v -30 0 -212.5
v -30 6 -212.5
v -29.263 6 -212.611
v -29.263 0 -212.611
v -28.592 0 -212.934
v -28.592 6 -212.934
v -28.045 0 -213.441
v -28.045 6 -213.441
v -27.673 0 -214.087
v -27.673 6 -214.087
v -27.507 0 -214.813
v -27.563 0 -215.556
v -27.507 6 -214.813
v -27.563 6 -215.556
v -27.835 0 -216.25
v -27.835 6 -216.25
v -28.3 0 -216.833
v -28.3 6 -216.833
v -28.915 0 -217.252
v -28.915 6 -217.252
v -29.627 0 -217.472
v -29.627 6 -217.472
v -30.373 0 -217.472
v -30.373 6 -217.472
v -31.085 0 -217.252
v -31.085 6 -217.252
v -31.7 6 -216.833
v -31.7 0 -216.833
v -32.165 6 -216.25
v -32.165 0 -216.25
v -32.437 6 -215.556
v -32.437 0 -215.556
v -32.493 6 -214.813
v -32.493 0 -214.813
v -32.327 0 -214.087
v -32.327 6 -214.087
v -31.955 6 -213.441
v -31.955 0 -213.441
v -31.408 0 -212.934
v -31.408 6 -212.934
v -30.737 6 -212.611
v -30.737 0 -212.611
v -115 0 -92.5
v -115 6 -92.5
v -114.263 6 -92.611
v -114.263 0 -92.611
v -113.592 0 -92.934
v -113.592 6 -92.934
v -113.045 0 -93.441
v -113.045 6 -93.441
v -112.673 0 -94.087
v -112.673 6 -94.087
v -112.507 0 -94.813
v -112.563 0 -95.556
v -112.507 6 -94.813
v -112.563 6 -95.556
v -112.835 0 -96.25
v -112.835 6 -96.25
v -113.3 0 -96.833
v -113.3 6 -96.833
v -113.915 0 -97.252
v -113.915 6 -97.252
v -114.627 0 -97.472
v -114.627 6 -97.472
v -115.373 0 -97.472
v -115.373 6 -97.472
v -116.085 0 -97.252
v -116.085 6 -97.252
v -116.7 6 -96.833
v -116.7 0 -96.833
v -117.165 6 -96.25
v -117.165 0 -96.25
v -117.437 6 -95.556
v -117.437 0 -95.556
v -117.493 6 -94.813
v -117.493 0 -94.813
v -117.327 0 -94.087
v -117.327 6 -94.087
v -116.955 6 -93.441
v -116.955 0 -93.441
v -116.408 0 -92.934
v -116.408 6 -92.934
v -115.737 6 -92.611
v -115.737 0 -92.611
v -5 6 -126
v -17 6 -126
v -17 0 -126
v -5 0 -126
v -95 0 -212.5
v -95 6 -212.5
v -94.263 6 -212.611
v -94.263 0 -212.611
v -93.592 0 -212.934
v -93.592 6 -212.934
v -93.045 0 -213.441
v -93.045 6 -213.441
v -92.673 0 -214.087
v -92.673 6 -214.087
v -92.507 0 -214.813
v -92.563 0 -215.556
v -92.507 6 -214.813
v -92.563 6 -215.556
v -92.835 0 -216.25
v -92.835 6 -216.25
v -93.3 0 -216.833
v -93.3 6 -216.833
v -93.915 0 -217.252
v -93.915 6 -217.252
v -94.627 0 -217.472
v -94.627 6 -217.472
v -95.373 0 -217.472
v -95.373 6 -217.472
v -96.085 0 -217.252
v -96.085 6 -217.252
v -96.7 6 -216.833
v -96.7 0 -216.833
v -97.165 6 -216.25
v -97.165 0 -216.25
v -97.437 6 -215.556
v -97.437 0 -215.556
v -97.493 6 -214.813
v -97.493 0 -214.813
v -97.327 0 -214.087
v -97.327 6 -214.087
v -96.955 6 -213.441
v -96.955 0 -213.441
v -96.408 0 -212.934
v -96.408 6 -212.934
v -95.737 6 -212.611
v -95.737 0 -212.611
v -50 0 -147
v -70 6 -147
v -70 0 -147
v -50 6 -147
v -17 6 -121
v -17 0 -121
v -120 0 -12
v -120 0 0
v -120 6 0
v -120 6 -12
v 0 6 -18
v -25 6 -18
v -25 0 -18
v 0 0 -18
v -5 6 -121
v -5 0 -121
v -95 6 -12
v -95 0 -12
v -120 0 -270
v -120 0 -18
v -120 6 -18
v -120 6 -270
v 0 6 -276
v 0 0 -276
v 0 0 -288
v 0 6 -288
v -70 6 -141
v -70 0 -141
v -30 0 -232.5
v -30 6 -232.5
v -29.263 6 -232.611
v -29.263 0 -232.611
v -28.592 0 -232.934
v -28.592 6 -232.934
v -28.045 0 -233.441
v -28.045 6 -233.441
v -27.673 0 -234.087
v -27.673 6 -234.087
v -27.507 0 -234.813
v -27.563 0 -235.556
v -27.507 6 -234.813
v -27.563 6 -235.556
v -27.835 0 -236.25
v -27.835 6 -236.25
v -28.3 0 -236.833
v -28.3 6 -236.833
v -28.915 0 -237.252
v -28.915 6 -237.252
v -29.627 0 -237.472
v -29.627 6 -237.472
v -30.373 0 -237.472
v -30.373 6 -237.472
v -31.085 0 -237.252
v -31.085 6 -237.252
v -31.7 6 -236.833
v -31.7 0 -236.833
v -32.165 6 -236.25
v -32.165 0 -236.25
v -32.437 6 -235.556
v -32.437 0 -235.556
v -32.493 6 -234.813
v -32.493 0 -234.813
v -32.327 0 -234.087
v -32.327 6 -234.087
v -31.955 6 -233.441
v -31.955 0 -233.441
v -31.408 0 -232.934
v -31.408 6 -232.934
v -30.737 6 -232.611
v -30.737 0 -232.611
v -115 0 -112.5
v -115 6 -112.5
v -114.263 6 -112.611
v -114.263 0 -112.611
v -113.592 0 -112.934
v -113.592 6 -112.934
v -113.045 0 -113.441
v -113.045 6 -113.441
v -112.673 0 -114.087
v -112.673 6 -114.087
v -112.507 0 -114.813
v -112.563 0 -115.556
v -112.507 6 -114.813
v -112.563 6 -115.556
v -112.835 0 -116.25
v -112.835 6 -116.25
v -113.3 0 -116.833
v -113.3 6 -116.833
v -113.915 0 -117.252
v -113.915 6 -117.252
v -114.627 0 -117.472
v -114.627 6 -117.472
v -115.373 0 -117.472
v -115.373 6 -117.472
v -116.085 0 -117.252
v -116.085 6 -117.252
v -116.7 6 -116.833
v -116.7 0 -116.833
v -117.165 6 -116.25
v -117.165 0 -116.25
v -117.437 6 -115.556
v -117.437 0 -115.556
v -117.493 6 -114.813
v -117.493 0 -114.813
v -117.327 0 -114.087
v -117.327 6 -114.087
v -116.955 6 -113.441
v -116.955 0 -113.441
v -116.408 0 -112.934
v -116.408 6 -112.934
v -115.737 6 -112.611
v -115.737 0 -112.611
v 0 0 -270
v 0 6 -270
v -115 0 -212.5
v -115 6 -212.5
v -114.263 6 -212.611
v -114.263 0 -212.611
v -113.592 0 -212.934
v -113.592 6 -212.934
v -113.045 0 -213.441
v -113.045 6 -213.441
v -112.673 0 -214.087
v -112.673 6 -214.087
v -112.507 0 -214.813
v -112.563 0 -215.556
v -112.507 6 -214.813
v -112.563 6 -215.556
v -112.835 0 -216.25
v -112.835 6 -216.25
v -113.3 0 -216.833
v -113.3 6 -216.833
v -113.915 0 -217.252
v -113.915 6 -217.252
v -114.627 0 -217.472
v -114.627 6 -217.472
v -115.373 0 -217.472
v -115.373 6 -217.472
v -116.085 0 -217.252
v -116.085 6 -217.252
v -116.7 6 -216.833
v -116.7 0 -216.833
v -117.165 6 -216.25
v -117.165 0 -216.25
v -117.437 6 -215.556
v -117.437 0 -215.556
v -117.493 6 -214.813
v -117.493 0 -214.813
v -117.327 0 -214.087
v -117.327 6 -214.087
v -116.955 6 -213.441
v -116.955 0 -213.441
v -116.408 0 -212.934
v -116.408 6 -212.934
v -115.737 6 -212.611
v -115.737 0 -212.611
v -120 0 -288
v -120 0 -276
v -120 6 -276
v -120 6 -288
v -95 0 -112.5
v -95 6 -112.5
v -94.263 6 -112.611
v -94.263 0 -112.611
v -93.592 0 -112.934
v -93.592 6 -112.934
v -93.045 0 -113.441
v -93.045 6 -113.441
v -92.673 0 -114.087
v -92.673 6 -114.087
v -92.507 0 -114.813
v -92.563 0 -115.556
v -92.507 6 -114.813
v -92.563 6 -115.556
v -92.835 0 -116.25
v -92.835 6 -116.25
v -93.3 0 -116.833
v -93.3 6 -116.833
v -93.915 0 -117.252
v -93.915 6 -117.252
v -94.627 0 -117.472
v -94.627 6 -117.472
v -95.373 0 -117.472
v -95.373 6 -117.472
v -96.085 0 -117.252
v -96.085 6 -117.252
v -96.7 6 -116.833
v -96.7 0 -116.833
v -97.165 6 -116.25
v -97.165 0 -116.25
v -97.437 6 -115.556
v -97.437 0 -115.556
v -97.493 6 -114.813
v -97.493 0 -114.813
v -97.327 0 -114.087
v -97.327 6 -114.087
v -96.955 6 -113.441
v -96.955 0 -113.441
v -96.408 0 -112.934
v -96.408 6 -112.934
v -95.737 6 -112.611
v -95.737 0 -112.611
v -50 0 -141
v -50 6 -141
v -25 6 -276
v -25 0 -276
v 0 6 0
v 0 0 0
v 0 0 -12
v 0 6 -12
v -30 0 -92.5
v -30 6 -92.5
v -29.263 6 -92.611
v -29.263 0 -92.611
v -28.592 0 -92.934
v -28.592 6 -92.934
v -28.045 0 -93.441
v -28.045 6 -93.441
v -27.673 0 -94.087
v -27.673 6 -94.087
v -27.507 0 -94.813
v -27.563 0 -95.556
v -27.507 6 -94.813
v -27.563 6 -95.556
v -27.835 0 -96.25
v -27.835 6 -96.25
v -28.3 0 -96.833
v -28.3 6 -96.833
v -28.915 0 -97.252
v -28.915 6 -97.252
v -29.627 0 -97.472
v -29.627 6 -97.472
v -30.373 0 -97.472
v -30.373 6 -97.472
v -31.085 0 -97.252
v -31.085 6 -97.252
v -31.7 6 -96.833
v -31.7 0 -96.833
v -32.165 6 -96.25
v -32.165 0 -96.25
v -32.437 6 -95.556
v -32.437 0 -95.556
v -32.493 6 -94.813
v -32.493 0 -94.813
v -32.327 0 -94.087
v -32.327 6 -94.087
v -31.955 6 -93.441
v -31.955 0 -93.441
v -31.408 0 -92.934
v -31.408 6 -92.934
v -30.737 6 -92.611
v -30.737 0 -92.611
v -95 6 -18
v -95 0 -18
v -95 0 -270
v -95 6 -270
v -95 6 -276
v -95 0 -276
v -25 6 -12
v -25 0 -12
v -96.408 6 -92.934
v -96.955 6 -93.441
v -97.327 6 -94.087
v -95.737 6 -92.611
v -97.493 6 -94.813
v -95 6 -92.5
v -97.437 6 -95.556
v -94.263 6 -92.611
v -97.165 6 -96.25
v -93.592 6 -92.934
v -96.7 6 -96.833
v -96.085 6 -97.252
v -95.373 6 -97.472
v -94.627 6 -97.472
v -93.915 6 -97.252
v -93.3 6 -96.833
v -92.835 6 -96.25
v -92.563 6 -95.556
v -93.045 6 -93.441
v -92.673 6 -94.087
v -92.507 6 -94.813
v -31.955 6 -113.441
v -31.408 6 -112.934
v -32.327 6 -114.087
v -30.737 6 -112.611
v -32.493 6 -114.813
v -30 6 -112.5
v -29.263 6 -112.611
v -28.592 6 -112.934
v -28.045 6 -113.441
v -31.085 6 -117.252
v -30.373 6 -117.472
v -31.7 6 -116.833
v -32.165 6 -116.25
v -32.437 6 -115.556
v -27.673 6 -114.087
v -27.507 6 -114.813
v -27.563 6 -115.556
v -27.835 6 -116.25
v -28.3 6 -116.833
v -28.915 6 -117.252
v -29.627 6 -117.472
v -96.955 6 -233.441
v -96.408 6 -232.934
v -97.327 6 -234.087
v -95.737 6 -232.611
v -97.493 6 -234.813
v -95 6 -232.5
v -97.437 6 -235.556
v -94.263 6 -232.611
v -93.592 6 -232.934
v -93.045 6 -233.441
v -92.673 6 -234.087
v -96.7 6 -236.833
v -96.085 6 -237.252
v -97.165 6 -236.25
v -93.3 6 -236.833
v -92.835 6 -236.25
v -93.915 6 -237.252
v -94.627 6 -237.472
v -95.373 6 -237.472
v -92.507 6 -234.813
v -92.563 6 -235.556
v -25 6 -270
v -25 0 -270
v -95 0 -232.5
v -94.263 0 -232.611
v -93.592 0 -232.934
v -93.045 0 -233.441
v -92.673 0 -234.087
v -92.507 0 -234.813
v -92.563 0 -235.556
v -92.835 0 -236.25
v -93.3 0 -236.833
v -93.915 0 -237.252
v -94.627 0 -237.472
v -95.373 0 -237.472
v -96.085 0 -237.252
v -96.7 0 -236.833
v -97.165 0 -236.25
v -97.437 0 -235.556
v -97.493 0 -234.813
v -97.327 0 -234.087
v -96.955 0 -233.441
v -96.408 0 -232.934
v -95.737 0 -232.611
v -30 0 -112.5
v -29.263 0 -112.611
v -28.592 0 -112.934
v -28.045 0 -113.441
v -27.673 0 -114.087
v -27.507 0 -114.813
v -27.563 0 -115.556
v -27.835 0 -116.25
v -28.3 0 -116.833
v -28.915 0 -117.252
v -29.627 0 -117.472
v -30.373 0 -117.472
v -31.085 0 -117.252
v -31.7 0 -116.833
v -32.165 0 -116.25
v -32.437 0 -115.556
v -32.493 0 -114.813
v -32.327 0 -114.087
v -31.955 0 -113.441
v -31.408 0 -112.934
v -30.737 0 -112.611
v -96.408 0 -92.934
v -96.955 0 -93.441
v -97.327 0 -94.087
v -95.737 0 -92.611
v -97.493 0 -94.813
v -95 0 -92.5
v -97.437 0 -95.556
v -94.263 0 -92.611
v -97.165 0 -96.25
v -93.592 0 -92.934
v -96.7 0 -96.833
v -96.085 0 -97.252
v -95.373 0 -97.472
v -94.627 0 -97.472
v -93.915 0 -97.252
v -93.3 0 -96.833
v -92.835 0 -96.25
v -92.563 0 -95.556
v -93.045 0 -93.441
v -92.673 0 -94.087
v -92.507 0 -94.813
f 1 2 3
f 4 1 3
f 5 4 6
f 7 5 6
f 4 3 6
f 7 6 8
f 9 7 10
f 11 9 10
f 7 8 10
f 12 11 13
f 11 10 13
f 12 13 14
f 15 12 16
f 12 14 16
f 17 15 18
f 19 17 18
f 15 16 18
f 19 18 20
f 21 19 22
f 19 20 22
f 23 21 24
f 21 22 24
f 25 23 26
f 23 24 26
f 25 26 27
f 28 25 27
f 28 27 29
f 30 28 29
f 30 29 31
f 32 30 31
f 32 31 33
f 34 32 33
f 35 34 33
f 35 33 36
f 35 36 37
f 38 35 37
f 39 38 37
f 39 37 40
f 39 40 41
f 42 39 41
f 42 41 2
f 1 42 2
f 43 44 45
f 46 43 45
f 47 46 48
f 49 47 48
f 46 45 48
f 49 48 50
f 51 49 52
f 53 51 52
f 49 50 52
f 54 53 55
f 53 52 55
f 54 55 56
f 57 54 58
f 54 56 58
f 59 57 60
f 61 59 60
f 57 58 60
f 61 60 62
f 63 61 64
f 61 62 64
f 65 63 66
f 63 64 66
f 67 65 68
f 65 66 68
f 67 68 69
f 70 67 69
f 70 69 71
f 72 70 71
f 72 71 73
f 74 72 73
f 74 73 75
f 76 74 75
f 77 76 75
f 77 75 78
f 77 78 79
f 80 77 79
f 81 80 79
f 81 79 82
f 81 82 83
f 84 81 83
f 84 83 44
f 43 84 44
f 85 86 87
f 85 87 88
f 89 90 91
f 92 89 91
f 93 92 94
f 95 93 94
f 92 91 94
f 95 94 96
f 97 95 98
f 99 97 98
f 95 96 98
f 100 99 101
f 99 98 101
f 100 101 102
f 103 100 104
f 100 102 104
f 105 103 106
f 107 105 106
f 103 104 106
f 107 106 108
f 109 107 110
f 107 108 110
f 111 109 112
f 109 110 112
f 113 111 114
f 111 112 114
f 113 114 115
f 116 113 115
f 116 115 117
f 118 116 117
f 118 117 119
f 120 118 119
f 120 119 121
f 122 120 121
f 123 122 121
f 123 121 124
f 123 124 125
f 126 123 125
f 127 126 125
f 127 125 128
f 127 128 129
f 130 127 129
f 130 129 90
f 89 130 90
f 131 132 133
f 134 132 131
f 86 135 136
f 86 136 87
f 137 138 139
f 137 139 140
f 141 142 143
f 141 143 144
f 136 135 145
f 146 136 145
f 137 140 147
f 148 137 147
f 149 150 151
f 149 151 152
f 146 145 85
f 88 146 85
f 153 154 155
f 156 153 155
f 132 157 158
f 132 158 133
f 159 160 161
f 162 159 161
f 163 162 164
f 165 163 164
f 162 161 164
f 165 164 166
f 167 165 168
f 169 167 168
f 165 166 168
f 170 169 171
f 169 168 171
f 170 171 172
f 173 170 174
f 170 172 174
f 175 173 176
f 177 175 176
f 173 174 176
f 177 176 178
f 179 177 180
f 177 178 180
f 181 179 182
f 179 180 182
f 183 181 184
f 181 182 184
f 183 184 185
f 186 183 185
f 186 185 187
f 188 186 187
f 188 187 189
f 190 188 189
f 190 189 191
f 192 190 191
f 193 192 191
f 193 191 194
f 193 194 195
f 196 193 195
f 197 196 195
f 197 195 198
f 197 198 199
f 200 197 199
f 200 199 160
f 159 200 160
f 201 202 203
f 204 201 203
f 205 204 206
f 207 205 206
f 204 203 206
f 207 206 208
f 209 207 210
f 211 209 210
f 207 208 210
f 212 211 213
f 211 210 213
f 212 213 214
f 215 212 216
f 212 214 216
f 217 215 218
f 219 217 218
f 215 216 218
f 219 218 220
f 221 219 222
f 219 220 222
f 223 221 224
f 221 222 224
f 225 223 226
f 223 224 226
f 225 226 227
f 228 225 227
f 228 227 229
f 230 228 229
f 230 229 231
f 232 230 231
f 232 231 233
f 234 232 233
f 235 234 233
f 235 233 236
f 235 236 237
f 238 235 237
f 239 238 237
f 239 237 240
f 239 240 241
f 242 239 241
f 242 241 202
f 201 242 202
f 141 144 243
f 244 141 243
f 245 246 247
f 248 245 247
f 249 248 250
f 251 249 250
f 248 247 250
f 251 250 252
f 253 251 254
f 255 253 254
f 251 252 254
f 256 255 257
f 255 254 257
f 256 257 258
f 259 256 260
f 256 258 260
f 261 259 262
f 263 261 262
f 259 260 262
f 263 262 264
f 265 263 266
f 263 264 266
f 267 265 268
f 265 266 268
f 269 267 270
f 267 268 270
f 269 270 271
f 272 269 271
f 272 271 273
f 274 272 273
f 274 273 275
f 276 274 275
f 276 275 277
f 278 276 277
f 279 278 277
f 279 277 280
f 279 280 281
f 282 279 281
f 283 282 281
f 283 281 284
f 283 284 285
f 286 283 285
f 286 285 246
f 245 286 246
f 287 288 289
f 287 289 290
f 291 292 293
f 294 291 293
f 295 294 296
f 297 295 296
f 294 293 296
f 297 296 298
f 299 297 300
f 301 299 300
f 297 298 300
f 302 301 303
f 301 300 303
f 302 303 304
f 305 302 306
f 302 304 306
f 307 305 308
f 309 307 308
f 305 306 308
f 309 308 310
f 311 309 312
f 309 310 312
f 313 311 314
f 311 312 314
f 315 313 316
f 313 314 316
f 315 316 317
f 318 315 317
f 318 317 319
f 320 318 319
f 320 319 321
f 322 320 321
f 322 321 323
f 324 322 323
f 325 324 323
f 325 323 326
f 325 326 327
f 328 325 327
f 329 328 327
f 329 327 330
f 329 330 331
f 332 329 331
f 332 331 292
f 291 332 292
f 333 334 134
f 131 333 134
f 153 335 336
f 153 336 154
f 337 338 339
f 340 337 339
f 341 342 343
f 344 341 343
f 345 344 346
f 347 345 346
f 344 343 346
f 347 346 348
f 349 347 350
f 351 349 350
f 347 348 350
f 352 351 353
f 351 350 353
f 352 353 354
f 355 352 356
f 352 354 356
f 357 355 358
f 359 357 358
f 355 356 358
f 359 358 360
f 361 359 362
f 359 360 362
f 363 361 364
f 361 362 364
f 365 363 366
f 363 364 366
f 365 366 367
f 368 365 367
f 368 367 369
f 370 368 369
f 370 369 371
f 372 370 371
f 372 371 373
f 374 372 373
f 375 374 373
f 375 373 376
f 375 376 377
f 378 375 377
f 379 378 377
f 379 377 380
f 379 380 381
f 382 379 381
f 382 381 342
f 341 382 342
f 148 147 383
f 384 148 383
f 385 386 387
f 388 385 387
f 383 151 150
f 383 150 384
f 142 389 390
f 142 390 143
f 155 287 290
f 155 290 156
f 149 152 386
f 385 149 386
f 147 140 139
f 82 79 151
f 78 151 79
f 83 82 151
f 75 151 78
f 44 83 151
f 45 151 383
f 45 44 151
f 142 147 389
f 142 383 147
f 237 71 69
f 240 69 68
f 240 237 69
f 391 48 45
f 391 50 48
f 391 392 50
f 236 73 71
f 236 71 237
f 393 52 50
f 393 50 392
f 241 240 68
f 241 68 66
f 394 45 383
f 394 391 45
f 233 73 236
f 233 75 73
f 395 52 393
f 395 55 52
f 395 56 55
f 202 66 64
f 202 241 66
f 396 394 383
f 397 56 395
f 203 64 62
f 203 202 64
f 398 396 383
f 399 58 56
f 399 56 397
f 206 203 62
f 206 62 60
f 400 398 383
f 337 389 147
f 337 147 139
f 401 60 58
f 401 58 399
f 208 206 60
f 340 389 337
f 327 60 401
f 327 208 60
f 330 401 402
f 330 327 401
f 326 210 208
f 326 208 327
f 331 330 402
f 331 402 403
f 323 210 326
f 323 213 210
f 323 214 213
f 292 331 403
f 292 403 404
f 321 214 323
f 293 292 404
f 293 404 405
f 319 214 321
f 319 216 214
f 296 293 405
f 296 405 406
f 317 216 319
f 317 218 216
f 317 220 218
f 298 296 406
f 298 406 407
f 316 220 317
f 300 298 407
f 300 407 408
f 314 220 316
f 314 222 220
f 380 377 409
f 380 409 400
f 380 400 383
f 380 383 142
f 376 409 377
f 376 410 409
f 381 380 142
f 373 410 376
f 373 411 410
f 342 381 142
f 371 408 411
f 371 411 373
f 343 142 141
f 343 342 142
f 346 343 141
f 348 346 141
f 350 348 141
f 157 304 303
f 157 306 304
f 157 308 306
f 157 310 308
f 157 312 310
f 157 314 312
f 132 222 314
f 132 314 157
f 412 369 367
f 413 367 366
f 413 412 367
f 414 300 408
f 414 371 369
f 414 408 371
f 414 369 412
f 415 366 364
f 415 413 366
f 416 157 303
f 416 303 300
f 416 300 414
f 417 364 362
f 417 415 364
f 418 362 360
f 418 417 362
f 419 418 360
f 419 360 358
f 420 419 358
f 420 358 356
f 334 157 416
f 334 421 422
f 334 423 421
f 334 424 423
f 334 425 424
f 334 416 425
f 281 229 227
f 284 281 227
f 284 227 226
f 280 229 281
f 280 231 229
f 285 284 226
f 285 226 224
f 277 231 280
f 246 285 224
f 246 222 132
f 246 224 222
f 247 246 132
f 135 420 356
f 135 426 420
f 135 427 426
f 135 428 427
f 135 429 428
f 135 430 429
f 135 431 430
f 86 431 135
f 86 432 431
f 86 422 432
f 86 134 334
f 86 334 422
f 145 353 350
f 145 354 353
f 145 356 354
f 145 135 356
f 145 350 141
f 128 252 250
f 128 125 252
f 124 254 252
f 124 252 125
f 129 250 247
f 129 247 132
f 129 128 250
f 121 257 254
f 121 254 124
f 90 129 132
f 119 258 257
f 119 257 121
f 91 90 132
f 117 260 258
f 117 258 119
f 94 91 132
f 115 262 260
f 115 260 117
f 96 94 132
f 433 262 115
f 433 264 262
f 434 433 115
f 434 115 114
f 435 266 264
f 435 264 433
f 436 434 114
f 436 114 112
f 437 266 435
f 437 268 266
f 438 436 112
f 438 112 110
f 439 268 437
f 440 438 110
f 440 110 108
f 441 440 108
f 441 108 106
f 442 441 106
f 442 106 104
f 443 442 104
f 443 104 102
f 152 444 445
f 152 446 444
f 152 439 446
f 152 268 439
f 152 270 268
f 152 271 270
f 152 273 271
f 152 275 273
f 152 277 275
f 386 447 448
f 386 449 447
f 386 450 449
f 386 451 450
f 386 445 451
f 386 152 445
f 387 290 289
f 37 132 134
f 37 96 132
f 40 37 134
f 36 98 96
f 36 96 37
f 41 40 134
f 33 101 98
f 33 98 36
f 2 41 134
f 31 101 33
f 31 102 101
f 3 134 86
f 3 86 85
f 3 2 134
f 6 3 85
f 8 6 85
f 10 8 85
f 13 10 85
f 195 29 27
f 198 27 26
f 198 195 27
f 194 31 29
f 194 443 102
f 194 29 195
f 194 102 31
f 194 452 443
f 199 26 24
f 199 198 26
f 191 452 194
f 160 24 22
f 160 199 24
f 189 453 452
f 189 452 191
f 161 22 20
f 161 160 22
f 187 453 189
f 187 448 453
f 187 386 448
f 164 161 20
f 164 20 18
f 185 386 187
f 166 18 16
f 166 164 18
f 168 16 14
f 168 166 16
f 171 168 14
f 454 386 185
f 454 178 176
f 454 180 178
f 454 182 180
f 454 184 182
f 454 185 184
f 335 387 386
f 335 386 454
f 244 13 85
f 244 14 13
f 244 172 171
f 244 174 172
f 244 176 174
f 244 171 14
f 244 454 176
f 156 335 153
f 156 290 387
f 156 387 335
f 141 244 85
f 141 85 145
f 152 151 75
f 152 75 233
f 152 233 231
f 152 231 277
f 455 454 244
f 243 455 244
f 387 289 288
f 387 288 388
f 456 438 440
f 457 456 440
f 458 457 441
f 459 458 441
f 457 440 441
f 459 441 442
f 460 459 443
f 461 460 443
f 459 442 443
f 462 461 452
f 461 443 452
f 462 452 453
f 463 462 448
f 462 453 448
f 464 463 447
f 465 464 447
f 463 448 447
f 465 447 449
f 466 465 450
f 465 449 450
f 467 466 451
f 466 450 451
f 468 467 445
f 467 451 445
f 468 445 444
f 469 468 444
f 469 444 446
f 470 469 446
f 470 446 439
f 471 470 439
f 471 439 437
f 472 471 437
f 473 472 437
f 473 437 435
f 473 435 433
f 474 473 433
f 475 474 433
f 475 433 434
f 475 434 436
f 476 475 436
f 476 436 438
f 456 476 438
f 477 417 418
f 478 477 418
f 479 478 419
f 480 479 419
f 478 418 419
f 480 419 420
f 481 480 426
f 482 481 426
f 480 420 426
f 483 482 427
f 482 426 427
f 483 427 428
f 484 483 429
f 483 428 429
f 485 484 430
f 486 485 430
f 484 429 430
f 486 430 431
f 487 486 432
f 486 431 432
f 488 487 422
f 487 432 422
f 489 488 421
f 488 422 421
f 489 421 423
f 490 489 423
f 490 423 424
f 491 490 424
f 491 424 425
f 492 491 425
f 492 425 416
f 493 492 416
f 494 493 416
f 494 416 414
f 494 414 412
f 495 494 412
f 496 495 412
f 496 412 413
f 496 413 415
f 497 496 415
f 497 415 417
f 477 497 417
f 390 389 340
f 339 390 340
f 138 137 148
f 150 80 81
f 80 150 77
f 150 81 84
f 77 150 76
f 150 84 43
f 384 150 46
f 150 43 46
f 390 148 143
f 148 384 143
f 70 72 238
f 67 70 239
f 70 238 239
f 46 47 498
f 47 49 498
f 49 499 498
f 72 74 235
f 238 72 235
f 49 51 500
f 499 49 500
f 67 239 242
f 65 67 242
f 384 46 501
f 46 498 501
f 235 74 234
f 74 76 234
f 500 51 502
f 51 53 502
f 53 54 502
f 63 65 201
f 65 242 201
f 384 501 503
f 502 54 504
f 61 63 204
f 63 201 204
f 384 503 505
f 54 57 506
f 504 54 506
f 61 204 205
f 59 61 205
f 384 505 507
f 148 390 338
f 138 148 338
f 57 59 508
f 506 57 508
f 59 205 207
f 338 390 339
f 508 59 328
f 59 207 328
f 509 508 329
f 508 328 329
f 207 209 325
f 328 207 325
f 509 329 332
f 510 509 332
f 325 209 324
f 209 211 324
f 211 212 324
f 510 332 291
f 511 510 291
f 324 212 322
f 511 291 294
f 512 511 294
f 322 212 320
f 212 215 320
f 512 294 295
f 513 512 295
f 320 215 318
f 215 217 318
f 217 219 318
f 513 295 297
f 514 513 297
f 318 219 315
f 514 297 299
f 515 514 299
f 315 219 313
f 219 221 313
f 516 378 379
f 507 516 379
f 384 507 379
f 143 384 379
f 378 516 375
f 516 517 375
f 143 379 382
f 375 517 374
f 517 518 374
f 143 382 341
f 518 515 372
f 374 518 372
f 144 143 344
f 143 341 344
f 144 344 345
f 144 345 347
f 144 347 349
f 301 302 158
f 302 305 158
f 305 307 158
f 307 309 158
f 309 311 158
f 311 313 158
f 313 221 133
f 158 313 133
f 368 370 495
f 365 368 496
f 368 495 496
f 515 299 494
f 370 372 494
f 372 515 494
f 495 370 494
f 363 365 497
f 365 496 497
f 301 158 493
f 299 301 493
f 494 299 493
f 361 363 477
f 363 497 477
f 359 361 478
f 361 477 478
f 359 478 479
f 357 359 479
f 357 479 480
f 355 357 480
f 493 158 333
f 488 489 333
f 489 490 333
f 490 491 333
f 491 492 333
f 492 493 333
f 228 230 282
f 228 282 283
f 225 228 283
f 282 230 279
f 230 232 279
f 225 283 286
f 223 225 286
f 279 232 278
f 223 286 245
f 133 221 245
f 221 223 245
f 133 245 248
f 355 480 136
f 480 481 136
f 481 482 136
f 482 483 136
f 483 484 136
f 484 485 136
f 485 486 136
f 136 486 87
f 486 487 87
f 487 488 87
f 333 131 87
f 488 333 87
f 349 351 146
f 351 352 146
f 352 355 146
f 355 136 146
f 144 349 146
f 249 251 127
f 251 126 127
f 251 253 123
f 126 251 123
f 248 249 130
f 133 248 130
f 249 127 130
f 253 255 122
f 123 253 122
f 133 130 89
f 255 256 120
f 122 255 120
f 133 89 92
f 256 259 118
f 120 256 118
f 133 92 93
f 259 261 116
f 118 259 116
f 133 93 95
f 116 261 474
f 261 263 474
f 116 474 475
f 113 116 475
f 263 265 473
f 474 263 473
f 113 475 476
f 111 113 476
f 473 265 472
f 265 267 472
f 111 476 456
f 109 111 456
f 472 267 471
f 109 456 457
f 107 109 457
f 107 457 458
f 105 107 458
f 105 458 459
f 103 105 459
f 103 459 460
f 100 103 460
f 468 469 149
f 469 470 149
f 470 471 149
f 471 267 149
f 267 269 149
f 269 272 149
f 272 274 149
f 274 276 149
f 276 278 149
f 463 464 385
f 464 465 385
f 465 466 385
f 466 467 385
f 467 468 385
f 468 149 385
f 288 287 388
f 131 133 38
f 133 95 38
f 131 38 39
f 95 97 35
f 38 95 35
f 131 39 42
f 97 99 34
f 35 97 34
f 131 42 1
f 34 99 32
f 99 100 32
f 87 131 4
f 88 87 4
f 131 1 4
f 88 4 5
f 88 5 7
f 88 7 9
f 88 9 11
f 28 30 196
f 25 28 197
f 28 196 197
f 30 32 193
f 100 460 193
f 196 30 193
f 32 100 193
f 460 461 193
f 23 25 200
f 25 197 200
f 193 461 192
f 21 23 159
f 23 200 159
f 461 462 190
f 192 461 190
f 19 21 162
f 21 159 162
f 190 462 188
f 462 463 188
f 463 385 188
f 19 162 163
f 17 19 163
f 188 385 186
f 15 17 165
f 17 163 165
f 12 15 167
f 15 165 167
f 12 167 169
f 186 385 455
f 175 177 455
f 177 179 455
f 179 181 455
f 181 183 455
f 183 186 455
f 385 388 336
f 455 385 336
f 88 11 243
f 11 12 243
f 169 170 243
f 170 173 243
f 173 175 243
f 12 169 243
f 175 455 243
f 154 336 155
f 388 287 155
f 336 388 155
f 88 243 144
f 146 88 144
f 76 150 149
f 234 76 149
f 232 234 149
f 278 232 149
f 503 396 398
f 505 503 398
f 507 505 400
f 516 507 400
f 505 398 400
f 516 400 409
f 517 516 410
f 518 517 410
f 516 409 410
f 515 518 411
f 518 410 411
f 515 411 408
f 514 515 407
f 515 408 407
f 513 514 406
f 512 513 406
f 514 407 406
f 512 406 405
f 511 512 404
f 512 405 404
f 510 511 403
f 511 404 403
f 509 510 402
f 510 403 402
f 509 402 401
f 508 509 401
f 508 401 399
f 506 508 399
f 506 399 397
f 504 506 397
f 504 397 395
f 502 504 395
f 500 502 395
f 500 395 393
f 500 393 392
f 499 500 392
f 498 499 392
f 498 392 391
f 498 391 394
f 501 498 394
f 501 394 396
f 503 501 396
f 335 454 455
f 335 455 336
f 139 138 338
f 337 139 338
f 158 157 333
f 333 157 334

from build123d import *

# Parameters (mm, degrees)
SKETCH1_W            = 120
SKETCH1_H            = 288
BOSS_EXTRUDE1_DEPTH  = 6
SKETCH2_W            = 25
SKETCH2_H            = 6
CUT_EXTRUDE1_DEPTH   = 313.057686975
LPATTERN1_COUNT      = 2
LPATTERN1_PITCH      = 258
LPATTERN1_COUNT_DIR2 = 2
LPATTERN1_PITCH_DIR2 = 95
SKETCH3_W            = 20
SKETCH3_H            = 6
CUT_EXTRUDE2_DEPTH   = 10
SKETCH4_R            = 2.5
CUT_EXTRUDE4_DEPTH   = 10
SKETCH6_W            = 12
SKETCH6_H            = 5
CUT_EXTRUDE5_DEPTH   = 10


with BuildPart() as part:
    # Sketch1 → Boss-Extrude1 (new body)
    with BuildSketch(Plane(origin=(0, 0, 0), x_dir=(1, 0, 0), z_dir=(0, 1, 0))):
        with Locations((-60, 144)):
            Rectangle(SKETCH1_W, SKETCH1_H)
    extrude(amount=BOSS_EXTRUDE1_DEPTH)

    # Sketch2 → Cut-Extrude1 (cut, through all)
    with BuildSketch(Plane(origin=(0, 6, 0), x_dir=(1, 0, 0), z_dir=(0, 1, 0))):
        with Locations((-107.5, 273)):
            Rectangle(SKETCH2_W, SKETCH2_H)
    cut_extrude1 = extrude(amount=-CUT_EXTRUDE1_DEPTH, mode=Mode.SUBTRACT)

    # LPattern1: Cut-Extrude1 2 × 2
    with Locations(*[(j * LPATTERN1_PITCH_DIR2, 0, i * LPATTERN1_PITCH) for i in range(LPATTERN1_COUNT) for j in range(LPATTERN1_COUNT_DIR2) if (i, j) != (0, 0)]):
        add(cut_extrude1, mode=Mode.SUBTRACT)

    # Sketch3 → Cut-Extrude2 (cut)
    with BuildSketch(Plane(origin=(0, 6, 0), x_dir=(1, 0, 0), z_dir=(0, 1, 0))):
        with Locations((-60, 144)):
            Rectangle(SKETCH3_W, SKETCH3_H)
    extrude(amount=-CUT_EXTRUDE2_DEPTH, mode=Mode.SUBTRACT)

    # Sketch4 → Cut-Extrude4 (cut)
    with BuildSketch(Plane(origin=(0, 6, 0), x_dir=(1, 0, 0), z_dir=(0, 1, 0))):
        with Locations(Location((-30, 235, 0), (0, 0, 270))):
            Circle(SKETCH4_R)
        with Locations(Location((-30, 215, 0), (0, 0, 270))):
            Circle(SKETCH4_R)
        with Locations(Location((-95, 235, 0), (0, 0, 270))):
            Circle(SKETCH4_R)
        with Locations(Location((-95, 215, 0), (0, 0, 270))):
            Circle(SKETCH4_R)
        with Locations(Location((-115, 215, 0), (0, 0, 270))):
            Circle(SKETCH4_R)
        with Locations(Location((-95, 115, 0), (0, 0, 270))):
            Circle(SKETCH4_R)
        with Locations(Location((-115, 115, 0), (0, 0, 270))):
            Circle(SKETCH4_R)
        with Locations(Location((-95, 95, 0), (0, 0, 270))):
            Circle(SKETCH4_R)
        with Locations(Location((-30, 115, 0), (0, 0, 270))):
            Circle(SKETCH4_R)
        with Locations(Location((-30, 95, 0), (0, 0, 270))):
            Circle(SKETCH4_R)
        with Locations(Location((-115, 95, 0), (0, 0, 270))):
            Circle(SKETCH4_R)
    extrude(amount=-CUT_EXTRUDE4_DEPTH, mode=Mode.SUBTRACT)

    # Sketch6 → Cut-Extrude5 (cut)
    with BuildSketch(Plane(origin=(0, 6, 0), x_dir=(1, 0, 0), z_dir=(0, 1, 0))):
        with Locations((-11, 123.5)):
            Rectangle(SKETCH6_W, SKETCH6_H)
    extrude(amount=-CUT_EXTRUDE5_DEPTH, mode=Mode.SUBTRACT)


solid = part.part
